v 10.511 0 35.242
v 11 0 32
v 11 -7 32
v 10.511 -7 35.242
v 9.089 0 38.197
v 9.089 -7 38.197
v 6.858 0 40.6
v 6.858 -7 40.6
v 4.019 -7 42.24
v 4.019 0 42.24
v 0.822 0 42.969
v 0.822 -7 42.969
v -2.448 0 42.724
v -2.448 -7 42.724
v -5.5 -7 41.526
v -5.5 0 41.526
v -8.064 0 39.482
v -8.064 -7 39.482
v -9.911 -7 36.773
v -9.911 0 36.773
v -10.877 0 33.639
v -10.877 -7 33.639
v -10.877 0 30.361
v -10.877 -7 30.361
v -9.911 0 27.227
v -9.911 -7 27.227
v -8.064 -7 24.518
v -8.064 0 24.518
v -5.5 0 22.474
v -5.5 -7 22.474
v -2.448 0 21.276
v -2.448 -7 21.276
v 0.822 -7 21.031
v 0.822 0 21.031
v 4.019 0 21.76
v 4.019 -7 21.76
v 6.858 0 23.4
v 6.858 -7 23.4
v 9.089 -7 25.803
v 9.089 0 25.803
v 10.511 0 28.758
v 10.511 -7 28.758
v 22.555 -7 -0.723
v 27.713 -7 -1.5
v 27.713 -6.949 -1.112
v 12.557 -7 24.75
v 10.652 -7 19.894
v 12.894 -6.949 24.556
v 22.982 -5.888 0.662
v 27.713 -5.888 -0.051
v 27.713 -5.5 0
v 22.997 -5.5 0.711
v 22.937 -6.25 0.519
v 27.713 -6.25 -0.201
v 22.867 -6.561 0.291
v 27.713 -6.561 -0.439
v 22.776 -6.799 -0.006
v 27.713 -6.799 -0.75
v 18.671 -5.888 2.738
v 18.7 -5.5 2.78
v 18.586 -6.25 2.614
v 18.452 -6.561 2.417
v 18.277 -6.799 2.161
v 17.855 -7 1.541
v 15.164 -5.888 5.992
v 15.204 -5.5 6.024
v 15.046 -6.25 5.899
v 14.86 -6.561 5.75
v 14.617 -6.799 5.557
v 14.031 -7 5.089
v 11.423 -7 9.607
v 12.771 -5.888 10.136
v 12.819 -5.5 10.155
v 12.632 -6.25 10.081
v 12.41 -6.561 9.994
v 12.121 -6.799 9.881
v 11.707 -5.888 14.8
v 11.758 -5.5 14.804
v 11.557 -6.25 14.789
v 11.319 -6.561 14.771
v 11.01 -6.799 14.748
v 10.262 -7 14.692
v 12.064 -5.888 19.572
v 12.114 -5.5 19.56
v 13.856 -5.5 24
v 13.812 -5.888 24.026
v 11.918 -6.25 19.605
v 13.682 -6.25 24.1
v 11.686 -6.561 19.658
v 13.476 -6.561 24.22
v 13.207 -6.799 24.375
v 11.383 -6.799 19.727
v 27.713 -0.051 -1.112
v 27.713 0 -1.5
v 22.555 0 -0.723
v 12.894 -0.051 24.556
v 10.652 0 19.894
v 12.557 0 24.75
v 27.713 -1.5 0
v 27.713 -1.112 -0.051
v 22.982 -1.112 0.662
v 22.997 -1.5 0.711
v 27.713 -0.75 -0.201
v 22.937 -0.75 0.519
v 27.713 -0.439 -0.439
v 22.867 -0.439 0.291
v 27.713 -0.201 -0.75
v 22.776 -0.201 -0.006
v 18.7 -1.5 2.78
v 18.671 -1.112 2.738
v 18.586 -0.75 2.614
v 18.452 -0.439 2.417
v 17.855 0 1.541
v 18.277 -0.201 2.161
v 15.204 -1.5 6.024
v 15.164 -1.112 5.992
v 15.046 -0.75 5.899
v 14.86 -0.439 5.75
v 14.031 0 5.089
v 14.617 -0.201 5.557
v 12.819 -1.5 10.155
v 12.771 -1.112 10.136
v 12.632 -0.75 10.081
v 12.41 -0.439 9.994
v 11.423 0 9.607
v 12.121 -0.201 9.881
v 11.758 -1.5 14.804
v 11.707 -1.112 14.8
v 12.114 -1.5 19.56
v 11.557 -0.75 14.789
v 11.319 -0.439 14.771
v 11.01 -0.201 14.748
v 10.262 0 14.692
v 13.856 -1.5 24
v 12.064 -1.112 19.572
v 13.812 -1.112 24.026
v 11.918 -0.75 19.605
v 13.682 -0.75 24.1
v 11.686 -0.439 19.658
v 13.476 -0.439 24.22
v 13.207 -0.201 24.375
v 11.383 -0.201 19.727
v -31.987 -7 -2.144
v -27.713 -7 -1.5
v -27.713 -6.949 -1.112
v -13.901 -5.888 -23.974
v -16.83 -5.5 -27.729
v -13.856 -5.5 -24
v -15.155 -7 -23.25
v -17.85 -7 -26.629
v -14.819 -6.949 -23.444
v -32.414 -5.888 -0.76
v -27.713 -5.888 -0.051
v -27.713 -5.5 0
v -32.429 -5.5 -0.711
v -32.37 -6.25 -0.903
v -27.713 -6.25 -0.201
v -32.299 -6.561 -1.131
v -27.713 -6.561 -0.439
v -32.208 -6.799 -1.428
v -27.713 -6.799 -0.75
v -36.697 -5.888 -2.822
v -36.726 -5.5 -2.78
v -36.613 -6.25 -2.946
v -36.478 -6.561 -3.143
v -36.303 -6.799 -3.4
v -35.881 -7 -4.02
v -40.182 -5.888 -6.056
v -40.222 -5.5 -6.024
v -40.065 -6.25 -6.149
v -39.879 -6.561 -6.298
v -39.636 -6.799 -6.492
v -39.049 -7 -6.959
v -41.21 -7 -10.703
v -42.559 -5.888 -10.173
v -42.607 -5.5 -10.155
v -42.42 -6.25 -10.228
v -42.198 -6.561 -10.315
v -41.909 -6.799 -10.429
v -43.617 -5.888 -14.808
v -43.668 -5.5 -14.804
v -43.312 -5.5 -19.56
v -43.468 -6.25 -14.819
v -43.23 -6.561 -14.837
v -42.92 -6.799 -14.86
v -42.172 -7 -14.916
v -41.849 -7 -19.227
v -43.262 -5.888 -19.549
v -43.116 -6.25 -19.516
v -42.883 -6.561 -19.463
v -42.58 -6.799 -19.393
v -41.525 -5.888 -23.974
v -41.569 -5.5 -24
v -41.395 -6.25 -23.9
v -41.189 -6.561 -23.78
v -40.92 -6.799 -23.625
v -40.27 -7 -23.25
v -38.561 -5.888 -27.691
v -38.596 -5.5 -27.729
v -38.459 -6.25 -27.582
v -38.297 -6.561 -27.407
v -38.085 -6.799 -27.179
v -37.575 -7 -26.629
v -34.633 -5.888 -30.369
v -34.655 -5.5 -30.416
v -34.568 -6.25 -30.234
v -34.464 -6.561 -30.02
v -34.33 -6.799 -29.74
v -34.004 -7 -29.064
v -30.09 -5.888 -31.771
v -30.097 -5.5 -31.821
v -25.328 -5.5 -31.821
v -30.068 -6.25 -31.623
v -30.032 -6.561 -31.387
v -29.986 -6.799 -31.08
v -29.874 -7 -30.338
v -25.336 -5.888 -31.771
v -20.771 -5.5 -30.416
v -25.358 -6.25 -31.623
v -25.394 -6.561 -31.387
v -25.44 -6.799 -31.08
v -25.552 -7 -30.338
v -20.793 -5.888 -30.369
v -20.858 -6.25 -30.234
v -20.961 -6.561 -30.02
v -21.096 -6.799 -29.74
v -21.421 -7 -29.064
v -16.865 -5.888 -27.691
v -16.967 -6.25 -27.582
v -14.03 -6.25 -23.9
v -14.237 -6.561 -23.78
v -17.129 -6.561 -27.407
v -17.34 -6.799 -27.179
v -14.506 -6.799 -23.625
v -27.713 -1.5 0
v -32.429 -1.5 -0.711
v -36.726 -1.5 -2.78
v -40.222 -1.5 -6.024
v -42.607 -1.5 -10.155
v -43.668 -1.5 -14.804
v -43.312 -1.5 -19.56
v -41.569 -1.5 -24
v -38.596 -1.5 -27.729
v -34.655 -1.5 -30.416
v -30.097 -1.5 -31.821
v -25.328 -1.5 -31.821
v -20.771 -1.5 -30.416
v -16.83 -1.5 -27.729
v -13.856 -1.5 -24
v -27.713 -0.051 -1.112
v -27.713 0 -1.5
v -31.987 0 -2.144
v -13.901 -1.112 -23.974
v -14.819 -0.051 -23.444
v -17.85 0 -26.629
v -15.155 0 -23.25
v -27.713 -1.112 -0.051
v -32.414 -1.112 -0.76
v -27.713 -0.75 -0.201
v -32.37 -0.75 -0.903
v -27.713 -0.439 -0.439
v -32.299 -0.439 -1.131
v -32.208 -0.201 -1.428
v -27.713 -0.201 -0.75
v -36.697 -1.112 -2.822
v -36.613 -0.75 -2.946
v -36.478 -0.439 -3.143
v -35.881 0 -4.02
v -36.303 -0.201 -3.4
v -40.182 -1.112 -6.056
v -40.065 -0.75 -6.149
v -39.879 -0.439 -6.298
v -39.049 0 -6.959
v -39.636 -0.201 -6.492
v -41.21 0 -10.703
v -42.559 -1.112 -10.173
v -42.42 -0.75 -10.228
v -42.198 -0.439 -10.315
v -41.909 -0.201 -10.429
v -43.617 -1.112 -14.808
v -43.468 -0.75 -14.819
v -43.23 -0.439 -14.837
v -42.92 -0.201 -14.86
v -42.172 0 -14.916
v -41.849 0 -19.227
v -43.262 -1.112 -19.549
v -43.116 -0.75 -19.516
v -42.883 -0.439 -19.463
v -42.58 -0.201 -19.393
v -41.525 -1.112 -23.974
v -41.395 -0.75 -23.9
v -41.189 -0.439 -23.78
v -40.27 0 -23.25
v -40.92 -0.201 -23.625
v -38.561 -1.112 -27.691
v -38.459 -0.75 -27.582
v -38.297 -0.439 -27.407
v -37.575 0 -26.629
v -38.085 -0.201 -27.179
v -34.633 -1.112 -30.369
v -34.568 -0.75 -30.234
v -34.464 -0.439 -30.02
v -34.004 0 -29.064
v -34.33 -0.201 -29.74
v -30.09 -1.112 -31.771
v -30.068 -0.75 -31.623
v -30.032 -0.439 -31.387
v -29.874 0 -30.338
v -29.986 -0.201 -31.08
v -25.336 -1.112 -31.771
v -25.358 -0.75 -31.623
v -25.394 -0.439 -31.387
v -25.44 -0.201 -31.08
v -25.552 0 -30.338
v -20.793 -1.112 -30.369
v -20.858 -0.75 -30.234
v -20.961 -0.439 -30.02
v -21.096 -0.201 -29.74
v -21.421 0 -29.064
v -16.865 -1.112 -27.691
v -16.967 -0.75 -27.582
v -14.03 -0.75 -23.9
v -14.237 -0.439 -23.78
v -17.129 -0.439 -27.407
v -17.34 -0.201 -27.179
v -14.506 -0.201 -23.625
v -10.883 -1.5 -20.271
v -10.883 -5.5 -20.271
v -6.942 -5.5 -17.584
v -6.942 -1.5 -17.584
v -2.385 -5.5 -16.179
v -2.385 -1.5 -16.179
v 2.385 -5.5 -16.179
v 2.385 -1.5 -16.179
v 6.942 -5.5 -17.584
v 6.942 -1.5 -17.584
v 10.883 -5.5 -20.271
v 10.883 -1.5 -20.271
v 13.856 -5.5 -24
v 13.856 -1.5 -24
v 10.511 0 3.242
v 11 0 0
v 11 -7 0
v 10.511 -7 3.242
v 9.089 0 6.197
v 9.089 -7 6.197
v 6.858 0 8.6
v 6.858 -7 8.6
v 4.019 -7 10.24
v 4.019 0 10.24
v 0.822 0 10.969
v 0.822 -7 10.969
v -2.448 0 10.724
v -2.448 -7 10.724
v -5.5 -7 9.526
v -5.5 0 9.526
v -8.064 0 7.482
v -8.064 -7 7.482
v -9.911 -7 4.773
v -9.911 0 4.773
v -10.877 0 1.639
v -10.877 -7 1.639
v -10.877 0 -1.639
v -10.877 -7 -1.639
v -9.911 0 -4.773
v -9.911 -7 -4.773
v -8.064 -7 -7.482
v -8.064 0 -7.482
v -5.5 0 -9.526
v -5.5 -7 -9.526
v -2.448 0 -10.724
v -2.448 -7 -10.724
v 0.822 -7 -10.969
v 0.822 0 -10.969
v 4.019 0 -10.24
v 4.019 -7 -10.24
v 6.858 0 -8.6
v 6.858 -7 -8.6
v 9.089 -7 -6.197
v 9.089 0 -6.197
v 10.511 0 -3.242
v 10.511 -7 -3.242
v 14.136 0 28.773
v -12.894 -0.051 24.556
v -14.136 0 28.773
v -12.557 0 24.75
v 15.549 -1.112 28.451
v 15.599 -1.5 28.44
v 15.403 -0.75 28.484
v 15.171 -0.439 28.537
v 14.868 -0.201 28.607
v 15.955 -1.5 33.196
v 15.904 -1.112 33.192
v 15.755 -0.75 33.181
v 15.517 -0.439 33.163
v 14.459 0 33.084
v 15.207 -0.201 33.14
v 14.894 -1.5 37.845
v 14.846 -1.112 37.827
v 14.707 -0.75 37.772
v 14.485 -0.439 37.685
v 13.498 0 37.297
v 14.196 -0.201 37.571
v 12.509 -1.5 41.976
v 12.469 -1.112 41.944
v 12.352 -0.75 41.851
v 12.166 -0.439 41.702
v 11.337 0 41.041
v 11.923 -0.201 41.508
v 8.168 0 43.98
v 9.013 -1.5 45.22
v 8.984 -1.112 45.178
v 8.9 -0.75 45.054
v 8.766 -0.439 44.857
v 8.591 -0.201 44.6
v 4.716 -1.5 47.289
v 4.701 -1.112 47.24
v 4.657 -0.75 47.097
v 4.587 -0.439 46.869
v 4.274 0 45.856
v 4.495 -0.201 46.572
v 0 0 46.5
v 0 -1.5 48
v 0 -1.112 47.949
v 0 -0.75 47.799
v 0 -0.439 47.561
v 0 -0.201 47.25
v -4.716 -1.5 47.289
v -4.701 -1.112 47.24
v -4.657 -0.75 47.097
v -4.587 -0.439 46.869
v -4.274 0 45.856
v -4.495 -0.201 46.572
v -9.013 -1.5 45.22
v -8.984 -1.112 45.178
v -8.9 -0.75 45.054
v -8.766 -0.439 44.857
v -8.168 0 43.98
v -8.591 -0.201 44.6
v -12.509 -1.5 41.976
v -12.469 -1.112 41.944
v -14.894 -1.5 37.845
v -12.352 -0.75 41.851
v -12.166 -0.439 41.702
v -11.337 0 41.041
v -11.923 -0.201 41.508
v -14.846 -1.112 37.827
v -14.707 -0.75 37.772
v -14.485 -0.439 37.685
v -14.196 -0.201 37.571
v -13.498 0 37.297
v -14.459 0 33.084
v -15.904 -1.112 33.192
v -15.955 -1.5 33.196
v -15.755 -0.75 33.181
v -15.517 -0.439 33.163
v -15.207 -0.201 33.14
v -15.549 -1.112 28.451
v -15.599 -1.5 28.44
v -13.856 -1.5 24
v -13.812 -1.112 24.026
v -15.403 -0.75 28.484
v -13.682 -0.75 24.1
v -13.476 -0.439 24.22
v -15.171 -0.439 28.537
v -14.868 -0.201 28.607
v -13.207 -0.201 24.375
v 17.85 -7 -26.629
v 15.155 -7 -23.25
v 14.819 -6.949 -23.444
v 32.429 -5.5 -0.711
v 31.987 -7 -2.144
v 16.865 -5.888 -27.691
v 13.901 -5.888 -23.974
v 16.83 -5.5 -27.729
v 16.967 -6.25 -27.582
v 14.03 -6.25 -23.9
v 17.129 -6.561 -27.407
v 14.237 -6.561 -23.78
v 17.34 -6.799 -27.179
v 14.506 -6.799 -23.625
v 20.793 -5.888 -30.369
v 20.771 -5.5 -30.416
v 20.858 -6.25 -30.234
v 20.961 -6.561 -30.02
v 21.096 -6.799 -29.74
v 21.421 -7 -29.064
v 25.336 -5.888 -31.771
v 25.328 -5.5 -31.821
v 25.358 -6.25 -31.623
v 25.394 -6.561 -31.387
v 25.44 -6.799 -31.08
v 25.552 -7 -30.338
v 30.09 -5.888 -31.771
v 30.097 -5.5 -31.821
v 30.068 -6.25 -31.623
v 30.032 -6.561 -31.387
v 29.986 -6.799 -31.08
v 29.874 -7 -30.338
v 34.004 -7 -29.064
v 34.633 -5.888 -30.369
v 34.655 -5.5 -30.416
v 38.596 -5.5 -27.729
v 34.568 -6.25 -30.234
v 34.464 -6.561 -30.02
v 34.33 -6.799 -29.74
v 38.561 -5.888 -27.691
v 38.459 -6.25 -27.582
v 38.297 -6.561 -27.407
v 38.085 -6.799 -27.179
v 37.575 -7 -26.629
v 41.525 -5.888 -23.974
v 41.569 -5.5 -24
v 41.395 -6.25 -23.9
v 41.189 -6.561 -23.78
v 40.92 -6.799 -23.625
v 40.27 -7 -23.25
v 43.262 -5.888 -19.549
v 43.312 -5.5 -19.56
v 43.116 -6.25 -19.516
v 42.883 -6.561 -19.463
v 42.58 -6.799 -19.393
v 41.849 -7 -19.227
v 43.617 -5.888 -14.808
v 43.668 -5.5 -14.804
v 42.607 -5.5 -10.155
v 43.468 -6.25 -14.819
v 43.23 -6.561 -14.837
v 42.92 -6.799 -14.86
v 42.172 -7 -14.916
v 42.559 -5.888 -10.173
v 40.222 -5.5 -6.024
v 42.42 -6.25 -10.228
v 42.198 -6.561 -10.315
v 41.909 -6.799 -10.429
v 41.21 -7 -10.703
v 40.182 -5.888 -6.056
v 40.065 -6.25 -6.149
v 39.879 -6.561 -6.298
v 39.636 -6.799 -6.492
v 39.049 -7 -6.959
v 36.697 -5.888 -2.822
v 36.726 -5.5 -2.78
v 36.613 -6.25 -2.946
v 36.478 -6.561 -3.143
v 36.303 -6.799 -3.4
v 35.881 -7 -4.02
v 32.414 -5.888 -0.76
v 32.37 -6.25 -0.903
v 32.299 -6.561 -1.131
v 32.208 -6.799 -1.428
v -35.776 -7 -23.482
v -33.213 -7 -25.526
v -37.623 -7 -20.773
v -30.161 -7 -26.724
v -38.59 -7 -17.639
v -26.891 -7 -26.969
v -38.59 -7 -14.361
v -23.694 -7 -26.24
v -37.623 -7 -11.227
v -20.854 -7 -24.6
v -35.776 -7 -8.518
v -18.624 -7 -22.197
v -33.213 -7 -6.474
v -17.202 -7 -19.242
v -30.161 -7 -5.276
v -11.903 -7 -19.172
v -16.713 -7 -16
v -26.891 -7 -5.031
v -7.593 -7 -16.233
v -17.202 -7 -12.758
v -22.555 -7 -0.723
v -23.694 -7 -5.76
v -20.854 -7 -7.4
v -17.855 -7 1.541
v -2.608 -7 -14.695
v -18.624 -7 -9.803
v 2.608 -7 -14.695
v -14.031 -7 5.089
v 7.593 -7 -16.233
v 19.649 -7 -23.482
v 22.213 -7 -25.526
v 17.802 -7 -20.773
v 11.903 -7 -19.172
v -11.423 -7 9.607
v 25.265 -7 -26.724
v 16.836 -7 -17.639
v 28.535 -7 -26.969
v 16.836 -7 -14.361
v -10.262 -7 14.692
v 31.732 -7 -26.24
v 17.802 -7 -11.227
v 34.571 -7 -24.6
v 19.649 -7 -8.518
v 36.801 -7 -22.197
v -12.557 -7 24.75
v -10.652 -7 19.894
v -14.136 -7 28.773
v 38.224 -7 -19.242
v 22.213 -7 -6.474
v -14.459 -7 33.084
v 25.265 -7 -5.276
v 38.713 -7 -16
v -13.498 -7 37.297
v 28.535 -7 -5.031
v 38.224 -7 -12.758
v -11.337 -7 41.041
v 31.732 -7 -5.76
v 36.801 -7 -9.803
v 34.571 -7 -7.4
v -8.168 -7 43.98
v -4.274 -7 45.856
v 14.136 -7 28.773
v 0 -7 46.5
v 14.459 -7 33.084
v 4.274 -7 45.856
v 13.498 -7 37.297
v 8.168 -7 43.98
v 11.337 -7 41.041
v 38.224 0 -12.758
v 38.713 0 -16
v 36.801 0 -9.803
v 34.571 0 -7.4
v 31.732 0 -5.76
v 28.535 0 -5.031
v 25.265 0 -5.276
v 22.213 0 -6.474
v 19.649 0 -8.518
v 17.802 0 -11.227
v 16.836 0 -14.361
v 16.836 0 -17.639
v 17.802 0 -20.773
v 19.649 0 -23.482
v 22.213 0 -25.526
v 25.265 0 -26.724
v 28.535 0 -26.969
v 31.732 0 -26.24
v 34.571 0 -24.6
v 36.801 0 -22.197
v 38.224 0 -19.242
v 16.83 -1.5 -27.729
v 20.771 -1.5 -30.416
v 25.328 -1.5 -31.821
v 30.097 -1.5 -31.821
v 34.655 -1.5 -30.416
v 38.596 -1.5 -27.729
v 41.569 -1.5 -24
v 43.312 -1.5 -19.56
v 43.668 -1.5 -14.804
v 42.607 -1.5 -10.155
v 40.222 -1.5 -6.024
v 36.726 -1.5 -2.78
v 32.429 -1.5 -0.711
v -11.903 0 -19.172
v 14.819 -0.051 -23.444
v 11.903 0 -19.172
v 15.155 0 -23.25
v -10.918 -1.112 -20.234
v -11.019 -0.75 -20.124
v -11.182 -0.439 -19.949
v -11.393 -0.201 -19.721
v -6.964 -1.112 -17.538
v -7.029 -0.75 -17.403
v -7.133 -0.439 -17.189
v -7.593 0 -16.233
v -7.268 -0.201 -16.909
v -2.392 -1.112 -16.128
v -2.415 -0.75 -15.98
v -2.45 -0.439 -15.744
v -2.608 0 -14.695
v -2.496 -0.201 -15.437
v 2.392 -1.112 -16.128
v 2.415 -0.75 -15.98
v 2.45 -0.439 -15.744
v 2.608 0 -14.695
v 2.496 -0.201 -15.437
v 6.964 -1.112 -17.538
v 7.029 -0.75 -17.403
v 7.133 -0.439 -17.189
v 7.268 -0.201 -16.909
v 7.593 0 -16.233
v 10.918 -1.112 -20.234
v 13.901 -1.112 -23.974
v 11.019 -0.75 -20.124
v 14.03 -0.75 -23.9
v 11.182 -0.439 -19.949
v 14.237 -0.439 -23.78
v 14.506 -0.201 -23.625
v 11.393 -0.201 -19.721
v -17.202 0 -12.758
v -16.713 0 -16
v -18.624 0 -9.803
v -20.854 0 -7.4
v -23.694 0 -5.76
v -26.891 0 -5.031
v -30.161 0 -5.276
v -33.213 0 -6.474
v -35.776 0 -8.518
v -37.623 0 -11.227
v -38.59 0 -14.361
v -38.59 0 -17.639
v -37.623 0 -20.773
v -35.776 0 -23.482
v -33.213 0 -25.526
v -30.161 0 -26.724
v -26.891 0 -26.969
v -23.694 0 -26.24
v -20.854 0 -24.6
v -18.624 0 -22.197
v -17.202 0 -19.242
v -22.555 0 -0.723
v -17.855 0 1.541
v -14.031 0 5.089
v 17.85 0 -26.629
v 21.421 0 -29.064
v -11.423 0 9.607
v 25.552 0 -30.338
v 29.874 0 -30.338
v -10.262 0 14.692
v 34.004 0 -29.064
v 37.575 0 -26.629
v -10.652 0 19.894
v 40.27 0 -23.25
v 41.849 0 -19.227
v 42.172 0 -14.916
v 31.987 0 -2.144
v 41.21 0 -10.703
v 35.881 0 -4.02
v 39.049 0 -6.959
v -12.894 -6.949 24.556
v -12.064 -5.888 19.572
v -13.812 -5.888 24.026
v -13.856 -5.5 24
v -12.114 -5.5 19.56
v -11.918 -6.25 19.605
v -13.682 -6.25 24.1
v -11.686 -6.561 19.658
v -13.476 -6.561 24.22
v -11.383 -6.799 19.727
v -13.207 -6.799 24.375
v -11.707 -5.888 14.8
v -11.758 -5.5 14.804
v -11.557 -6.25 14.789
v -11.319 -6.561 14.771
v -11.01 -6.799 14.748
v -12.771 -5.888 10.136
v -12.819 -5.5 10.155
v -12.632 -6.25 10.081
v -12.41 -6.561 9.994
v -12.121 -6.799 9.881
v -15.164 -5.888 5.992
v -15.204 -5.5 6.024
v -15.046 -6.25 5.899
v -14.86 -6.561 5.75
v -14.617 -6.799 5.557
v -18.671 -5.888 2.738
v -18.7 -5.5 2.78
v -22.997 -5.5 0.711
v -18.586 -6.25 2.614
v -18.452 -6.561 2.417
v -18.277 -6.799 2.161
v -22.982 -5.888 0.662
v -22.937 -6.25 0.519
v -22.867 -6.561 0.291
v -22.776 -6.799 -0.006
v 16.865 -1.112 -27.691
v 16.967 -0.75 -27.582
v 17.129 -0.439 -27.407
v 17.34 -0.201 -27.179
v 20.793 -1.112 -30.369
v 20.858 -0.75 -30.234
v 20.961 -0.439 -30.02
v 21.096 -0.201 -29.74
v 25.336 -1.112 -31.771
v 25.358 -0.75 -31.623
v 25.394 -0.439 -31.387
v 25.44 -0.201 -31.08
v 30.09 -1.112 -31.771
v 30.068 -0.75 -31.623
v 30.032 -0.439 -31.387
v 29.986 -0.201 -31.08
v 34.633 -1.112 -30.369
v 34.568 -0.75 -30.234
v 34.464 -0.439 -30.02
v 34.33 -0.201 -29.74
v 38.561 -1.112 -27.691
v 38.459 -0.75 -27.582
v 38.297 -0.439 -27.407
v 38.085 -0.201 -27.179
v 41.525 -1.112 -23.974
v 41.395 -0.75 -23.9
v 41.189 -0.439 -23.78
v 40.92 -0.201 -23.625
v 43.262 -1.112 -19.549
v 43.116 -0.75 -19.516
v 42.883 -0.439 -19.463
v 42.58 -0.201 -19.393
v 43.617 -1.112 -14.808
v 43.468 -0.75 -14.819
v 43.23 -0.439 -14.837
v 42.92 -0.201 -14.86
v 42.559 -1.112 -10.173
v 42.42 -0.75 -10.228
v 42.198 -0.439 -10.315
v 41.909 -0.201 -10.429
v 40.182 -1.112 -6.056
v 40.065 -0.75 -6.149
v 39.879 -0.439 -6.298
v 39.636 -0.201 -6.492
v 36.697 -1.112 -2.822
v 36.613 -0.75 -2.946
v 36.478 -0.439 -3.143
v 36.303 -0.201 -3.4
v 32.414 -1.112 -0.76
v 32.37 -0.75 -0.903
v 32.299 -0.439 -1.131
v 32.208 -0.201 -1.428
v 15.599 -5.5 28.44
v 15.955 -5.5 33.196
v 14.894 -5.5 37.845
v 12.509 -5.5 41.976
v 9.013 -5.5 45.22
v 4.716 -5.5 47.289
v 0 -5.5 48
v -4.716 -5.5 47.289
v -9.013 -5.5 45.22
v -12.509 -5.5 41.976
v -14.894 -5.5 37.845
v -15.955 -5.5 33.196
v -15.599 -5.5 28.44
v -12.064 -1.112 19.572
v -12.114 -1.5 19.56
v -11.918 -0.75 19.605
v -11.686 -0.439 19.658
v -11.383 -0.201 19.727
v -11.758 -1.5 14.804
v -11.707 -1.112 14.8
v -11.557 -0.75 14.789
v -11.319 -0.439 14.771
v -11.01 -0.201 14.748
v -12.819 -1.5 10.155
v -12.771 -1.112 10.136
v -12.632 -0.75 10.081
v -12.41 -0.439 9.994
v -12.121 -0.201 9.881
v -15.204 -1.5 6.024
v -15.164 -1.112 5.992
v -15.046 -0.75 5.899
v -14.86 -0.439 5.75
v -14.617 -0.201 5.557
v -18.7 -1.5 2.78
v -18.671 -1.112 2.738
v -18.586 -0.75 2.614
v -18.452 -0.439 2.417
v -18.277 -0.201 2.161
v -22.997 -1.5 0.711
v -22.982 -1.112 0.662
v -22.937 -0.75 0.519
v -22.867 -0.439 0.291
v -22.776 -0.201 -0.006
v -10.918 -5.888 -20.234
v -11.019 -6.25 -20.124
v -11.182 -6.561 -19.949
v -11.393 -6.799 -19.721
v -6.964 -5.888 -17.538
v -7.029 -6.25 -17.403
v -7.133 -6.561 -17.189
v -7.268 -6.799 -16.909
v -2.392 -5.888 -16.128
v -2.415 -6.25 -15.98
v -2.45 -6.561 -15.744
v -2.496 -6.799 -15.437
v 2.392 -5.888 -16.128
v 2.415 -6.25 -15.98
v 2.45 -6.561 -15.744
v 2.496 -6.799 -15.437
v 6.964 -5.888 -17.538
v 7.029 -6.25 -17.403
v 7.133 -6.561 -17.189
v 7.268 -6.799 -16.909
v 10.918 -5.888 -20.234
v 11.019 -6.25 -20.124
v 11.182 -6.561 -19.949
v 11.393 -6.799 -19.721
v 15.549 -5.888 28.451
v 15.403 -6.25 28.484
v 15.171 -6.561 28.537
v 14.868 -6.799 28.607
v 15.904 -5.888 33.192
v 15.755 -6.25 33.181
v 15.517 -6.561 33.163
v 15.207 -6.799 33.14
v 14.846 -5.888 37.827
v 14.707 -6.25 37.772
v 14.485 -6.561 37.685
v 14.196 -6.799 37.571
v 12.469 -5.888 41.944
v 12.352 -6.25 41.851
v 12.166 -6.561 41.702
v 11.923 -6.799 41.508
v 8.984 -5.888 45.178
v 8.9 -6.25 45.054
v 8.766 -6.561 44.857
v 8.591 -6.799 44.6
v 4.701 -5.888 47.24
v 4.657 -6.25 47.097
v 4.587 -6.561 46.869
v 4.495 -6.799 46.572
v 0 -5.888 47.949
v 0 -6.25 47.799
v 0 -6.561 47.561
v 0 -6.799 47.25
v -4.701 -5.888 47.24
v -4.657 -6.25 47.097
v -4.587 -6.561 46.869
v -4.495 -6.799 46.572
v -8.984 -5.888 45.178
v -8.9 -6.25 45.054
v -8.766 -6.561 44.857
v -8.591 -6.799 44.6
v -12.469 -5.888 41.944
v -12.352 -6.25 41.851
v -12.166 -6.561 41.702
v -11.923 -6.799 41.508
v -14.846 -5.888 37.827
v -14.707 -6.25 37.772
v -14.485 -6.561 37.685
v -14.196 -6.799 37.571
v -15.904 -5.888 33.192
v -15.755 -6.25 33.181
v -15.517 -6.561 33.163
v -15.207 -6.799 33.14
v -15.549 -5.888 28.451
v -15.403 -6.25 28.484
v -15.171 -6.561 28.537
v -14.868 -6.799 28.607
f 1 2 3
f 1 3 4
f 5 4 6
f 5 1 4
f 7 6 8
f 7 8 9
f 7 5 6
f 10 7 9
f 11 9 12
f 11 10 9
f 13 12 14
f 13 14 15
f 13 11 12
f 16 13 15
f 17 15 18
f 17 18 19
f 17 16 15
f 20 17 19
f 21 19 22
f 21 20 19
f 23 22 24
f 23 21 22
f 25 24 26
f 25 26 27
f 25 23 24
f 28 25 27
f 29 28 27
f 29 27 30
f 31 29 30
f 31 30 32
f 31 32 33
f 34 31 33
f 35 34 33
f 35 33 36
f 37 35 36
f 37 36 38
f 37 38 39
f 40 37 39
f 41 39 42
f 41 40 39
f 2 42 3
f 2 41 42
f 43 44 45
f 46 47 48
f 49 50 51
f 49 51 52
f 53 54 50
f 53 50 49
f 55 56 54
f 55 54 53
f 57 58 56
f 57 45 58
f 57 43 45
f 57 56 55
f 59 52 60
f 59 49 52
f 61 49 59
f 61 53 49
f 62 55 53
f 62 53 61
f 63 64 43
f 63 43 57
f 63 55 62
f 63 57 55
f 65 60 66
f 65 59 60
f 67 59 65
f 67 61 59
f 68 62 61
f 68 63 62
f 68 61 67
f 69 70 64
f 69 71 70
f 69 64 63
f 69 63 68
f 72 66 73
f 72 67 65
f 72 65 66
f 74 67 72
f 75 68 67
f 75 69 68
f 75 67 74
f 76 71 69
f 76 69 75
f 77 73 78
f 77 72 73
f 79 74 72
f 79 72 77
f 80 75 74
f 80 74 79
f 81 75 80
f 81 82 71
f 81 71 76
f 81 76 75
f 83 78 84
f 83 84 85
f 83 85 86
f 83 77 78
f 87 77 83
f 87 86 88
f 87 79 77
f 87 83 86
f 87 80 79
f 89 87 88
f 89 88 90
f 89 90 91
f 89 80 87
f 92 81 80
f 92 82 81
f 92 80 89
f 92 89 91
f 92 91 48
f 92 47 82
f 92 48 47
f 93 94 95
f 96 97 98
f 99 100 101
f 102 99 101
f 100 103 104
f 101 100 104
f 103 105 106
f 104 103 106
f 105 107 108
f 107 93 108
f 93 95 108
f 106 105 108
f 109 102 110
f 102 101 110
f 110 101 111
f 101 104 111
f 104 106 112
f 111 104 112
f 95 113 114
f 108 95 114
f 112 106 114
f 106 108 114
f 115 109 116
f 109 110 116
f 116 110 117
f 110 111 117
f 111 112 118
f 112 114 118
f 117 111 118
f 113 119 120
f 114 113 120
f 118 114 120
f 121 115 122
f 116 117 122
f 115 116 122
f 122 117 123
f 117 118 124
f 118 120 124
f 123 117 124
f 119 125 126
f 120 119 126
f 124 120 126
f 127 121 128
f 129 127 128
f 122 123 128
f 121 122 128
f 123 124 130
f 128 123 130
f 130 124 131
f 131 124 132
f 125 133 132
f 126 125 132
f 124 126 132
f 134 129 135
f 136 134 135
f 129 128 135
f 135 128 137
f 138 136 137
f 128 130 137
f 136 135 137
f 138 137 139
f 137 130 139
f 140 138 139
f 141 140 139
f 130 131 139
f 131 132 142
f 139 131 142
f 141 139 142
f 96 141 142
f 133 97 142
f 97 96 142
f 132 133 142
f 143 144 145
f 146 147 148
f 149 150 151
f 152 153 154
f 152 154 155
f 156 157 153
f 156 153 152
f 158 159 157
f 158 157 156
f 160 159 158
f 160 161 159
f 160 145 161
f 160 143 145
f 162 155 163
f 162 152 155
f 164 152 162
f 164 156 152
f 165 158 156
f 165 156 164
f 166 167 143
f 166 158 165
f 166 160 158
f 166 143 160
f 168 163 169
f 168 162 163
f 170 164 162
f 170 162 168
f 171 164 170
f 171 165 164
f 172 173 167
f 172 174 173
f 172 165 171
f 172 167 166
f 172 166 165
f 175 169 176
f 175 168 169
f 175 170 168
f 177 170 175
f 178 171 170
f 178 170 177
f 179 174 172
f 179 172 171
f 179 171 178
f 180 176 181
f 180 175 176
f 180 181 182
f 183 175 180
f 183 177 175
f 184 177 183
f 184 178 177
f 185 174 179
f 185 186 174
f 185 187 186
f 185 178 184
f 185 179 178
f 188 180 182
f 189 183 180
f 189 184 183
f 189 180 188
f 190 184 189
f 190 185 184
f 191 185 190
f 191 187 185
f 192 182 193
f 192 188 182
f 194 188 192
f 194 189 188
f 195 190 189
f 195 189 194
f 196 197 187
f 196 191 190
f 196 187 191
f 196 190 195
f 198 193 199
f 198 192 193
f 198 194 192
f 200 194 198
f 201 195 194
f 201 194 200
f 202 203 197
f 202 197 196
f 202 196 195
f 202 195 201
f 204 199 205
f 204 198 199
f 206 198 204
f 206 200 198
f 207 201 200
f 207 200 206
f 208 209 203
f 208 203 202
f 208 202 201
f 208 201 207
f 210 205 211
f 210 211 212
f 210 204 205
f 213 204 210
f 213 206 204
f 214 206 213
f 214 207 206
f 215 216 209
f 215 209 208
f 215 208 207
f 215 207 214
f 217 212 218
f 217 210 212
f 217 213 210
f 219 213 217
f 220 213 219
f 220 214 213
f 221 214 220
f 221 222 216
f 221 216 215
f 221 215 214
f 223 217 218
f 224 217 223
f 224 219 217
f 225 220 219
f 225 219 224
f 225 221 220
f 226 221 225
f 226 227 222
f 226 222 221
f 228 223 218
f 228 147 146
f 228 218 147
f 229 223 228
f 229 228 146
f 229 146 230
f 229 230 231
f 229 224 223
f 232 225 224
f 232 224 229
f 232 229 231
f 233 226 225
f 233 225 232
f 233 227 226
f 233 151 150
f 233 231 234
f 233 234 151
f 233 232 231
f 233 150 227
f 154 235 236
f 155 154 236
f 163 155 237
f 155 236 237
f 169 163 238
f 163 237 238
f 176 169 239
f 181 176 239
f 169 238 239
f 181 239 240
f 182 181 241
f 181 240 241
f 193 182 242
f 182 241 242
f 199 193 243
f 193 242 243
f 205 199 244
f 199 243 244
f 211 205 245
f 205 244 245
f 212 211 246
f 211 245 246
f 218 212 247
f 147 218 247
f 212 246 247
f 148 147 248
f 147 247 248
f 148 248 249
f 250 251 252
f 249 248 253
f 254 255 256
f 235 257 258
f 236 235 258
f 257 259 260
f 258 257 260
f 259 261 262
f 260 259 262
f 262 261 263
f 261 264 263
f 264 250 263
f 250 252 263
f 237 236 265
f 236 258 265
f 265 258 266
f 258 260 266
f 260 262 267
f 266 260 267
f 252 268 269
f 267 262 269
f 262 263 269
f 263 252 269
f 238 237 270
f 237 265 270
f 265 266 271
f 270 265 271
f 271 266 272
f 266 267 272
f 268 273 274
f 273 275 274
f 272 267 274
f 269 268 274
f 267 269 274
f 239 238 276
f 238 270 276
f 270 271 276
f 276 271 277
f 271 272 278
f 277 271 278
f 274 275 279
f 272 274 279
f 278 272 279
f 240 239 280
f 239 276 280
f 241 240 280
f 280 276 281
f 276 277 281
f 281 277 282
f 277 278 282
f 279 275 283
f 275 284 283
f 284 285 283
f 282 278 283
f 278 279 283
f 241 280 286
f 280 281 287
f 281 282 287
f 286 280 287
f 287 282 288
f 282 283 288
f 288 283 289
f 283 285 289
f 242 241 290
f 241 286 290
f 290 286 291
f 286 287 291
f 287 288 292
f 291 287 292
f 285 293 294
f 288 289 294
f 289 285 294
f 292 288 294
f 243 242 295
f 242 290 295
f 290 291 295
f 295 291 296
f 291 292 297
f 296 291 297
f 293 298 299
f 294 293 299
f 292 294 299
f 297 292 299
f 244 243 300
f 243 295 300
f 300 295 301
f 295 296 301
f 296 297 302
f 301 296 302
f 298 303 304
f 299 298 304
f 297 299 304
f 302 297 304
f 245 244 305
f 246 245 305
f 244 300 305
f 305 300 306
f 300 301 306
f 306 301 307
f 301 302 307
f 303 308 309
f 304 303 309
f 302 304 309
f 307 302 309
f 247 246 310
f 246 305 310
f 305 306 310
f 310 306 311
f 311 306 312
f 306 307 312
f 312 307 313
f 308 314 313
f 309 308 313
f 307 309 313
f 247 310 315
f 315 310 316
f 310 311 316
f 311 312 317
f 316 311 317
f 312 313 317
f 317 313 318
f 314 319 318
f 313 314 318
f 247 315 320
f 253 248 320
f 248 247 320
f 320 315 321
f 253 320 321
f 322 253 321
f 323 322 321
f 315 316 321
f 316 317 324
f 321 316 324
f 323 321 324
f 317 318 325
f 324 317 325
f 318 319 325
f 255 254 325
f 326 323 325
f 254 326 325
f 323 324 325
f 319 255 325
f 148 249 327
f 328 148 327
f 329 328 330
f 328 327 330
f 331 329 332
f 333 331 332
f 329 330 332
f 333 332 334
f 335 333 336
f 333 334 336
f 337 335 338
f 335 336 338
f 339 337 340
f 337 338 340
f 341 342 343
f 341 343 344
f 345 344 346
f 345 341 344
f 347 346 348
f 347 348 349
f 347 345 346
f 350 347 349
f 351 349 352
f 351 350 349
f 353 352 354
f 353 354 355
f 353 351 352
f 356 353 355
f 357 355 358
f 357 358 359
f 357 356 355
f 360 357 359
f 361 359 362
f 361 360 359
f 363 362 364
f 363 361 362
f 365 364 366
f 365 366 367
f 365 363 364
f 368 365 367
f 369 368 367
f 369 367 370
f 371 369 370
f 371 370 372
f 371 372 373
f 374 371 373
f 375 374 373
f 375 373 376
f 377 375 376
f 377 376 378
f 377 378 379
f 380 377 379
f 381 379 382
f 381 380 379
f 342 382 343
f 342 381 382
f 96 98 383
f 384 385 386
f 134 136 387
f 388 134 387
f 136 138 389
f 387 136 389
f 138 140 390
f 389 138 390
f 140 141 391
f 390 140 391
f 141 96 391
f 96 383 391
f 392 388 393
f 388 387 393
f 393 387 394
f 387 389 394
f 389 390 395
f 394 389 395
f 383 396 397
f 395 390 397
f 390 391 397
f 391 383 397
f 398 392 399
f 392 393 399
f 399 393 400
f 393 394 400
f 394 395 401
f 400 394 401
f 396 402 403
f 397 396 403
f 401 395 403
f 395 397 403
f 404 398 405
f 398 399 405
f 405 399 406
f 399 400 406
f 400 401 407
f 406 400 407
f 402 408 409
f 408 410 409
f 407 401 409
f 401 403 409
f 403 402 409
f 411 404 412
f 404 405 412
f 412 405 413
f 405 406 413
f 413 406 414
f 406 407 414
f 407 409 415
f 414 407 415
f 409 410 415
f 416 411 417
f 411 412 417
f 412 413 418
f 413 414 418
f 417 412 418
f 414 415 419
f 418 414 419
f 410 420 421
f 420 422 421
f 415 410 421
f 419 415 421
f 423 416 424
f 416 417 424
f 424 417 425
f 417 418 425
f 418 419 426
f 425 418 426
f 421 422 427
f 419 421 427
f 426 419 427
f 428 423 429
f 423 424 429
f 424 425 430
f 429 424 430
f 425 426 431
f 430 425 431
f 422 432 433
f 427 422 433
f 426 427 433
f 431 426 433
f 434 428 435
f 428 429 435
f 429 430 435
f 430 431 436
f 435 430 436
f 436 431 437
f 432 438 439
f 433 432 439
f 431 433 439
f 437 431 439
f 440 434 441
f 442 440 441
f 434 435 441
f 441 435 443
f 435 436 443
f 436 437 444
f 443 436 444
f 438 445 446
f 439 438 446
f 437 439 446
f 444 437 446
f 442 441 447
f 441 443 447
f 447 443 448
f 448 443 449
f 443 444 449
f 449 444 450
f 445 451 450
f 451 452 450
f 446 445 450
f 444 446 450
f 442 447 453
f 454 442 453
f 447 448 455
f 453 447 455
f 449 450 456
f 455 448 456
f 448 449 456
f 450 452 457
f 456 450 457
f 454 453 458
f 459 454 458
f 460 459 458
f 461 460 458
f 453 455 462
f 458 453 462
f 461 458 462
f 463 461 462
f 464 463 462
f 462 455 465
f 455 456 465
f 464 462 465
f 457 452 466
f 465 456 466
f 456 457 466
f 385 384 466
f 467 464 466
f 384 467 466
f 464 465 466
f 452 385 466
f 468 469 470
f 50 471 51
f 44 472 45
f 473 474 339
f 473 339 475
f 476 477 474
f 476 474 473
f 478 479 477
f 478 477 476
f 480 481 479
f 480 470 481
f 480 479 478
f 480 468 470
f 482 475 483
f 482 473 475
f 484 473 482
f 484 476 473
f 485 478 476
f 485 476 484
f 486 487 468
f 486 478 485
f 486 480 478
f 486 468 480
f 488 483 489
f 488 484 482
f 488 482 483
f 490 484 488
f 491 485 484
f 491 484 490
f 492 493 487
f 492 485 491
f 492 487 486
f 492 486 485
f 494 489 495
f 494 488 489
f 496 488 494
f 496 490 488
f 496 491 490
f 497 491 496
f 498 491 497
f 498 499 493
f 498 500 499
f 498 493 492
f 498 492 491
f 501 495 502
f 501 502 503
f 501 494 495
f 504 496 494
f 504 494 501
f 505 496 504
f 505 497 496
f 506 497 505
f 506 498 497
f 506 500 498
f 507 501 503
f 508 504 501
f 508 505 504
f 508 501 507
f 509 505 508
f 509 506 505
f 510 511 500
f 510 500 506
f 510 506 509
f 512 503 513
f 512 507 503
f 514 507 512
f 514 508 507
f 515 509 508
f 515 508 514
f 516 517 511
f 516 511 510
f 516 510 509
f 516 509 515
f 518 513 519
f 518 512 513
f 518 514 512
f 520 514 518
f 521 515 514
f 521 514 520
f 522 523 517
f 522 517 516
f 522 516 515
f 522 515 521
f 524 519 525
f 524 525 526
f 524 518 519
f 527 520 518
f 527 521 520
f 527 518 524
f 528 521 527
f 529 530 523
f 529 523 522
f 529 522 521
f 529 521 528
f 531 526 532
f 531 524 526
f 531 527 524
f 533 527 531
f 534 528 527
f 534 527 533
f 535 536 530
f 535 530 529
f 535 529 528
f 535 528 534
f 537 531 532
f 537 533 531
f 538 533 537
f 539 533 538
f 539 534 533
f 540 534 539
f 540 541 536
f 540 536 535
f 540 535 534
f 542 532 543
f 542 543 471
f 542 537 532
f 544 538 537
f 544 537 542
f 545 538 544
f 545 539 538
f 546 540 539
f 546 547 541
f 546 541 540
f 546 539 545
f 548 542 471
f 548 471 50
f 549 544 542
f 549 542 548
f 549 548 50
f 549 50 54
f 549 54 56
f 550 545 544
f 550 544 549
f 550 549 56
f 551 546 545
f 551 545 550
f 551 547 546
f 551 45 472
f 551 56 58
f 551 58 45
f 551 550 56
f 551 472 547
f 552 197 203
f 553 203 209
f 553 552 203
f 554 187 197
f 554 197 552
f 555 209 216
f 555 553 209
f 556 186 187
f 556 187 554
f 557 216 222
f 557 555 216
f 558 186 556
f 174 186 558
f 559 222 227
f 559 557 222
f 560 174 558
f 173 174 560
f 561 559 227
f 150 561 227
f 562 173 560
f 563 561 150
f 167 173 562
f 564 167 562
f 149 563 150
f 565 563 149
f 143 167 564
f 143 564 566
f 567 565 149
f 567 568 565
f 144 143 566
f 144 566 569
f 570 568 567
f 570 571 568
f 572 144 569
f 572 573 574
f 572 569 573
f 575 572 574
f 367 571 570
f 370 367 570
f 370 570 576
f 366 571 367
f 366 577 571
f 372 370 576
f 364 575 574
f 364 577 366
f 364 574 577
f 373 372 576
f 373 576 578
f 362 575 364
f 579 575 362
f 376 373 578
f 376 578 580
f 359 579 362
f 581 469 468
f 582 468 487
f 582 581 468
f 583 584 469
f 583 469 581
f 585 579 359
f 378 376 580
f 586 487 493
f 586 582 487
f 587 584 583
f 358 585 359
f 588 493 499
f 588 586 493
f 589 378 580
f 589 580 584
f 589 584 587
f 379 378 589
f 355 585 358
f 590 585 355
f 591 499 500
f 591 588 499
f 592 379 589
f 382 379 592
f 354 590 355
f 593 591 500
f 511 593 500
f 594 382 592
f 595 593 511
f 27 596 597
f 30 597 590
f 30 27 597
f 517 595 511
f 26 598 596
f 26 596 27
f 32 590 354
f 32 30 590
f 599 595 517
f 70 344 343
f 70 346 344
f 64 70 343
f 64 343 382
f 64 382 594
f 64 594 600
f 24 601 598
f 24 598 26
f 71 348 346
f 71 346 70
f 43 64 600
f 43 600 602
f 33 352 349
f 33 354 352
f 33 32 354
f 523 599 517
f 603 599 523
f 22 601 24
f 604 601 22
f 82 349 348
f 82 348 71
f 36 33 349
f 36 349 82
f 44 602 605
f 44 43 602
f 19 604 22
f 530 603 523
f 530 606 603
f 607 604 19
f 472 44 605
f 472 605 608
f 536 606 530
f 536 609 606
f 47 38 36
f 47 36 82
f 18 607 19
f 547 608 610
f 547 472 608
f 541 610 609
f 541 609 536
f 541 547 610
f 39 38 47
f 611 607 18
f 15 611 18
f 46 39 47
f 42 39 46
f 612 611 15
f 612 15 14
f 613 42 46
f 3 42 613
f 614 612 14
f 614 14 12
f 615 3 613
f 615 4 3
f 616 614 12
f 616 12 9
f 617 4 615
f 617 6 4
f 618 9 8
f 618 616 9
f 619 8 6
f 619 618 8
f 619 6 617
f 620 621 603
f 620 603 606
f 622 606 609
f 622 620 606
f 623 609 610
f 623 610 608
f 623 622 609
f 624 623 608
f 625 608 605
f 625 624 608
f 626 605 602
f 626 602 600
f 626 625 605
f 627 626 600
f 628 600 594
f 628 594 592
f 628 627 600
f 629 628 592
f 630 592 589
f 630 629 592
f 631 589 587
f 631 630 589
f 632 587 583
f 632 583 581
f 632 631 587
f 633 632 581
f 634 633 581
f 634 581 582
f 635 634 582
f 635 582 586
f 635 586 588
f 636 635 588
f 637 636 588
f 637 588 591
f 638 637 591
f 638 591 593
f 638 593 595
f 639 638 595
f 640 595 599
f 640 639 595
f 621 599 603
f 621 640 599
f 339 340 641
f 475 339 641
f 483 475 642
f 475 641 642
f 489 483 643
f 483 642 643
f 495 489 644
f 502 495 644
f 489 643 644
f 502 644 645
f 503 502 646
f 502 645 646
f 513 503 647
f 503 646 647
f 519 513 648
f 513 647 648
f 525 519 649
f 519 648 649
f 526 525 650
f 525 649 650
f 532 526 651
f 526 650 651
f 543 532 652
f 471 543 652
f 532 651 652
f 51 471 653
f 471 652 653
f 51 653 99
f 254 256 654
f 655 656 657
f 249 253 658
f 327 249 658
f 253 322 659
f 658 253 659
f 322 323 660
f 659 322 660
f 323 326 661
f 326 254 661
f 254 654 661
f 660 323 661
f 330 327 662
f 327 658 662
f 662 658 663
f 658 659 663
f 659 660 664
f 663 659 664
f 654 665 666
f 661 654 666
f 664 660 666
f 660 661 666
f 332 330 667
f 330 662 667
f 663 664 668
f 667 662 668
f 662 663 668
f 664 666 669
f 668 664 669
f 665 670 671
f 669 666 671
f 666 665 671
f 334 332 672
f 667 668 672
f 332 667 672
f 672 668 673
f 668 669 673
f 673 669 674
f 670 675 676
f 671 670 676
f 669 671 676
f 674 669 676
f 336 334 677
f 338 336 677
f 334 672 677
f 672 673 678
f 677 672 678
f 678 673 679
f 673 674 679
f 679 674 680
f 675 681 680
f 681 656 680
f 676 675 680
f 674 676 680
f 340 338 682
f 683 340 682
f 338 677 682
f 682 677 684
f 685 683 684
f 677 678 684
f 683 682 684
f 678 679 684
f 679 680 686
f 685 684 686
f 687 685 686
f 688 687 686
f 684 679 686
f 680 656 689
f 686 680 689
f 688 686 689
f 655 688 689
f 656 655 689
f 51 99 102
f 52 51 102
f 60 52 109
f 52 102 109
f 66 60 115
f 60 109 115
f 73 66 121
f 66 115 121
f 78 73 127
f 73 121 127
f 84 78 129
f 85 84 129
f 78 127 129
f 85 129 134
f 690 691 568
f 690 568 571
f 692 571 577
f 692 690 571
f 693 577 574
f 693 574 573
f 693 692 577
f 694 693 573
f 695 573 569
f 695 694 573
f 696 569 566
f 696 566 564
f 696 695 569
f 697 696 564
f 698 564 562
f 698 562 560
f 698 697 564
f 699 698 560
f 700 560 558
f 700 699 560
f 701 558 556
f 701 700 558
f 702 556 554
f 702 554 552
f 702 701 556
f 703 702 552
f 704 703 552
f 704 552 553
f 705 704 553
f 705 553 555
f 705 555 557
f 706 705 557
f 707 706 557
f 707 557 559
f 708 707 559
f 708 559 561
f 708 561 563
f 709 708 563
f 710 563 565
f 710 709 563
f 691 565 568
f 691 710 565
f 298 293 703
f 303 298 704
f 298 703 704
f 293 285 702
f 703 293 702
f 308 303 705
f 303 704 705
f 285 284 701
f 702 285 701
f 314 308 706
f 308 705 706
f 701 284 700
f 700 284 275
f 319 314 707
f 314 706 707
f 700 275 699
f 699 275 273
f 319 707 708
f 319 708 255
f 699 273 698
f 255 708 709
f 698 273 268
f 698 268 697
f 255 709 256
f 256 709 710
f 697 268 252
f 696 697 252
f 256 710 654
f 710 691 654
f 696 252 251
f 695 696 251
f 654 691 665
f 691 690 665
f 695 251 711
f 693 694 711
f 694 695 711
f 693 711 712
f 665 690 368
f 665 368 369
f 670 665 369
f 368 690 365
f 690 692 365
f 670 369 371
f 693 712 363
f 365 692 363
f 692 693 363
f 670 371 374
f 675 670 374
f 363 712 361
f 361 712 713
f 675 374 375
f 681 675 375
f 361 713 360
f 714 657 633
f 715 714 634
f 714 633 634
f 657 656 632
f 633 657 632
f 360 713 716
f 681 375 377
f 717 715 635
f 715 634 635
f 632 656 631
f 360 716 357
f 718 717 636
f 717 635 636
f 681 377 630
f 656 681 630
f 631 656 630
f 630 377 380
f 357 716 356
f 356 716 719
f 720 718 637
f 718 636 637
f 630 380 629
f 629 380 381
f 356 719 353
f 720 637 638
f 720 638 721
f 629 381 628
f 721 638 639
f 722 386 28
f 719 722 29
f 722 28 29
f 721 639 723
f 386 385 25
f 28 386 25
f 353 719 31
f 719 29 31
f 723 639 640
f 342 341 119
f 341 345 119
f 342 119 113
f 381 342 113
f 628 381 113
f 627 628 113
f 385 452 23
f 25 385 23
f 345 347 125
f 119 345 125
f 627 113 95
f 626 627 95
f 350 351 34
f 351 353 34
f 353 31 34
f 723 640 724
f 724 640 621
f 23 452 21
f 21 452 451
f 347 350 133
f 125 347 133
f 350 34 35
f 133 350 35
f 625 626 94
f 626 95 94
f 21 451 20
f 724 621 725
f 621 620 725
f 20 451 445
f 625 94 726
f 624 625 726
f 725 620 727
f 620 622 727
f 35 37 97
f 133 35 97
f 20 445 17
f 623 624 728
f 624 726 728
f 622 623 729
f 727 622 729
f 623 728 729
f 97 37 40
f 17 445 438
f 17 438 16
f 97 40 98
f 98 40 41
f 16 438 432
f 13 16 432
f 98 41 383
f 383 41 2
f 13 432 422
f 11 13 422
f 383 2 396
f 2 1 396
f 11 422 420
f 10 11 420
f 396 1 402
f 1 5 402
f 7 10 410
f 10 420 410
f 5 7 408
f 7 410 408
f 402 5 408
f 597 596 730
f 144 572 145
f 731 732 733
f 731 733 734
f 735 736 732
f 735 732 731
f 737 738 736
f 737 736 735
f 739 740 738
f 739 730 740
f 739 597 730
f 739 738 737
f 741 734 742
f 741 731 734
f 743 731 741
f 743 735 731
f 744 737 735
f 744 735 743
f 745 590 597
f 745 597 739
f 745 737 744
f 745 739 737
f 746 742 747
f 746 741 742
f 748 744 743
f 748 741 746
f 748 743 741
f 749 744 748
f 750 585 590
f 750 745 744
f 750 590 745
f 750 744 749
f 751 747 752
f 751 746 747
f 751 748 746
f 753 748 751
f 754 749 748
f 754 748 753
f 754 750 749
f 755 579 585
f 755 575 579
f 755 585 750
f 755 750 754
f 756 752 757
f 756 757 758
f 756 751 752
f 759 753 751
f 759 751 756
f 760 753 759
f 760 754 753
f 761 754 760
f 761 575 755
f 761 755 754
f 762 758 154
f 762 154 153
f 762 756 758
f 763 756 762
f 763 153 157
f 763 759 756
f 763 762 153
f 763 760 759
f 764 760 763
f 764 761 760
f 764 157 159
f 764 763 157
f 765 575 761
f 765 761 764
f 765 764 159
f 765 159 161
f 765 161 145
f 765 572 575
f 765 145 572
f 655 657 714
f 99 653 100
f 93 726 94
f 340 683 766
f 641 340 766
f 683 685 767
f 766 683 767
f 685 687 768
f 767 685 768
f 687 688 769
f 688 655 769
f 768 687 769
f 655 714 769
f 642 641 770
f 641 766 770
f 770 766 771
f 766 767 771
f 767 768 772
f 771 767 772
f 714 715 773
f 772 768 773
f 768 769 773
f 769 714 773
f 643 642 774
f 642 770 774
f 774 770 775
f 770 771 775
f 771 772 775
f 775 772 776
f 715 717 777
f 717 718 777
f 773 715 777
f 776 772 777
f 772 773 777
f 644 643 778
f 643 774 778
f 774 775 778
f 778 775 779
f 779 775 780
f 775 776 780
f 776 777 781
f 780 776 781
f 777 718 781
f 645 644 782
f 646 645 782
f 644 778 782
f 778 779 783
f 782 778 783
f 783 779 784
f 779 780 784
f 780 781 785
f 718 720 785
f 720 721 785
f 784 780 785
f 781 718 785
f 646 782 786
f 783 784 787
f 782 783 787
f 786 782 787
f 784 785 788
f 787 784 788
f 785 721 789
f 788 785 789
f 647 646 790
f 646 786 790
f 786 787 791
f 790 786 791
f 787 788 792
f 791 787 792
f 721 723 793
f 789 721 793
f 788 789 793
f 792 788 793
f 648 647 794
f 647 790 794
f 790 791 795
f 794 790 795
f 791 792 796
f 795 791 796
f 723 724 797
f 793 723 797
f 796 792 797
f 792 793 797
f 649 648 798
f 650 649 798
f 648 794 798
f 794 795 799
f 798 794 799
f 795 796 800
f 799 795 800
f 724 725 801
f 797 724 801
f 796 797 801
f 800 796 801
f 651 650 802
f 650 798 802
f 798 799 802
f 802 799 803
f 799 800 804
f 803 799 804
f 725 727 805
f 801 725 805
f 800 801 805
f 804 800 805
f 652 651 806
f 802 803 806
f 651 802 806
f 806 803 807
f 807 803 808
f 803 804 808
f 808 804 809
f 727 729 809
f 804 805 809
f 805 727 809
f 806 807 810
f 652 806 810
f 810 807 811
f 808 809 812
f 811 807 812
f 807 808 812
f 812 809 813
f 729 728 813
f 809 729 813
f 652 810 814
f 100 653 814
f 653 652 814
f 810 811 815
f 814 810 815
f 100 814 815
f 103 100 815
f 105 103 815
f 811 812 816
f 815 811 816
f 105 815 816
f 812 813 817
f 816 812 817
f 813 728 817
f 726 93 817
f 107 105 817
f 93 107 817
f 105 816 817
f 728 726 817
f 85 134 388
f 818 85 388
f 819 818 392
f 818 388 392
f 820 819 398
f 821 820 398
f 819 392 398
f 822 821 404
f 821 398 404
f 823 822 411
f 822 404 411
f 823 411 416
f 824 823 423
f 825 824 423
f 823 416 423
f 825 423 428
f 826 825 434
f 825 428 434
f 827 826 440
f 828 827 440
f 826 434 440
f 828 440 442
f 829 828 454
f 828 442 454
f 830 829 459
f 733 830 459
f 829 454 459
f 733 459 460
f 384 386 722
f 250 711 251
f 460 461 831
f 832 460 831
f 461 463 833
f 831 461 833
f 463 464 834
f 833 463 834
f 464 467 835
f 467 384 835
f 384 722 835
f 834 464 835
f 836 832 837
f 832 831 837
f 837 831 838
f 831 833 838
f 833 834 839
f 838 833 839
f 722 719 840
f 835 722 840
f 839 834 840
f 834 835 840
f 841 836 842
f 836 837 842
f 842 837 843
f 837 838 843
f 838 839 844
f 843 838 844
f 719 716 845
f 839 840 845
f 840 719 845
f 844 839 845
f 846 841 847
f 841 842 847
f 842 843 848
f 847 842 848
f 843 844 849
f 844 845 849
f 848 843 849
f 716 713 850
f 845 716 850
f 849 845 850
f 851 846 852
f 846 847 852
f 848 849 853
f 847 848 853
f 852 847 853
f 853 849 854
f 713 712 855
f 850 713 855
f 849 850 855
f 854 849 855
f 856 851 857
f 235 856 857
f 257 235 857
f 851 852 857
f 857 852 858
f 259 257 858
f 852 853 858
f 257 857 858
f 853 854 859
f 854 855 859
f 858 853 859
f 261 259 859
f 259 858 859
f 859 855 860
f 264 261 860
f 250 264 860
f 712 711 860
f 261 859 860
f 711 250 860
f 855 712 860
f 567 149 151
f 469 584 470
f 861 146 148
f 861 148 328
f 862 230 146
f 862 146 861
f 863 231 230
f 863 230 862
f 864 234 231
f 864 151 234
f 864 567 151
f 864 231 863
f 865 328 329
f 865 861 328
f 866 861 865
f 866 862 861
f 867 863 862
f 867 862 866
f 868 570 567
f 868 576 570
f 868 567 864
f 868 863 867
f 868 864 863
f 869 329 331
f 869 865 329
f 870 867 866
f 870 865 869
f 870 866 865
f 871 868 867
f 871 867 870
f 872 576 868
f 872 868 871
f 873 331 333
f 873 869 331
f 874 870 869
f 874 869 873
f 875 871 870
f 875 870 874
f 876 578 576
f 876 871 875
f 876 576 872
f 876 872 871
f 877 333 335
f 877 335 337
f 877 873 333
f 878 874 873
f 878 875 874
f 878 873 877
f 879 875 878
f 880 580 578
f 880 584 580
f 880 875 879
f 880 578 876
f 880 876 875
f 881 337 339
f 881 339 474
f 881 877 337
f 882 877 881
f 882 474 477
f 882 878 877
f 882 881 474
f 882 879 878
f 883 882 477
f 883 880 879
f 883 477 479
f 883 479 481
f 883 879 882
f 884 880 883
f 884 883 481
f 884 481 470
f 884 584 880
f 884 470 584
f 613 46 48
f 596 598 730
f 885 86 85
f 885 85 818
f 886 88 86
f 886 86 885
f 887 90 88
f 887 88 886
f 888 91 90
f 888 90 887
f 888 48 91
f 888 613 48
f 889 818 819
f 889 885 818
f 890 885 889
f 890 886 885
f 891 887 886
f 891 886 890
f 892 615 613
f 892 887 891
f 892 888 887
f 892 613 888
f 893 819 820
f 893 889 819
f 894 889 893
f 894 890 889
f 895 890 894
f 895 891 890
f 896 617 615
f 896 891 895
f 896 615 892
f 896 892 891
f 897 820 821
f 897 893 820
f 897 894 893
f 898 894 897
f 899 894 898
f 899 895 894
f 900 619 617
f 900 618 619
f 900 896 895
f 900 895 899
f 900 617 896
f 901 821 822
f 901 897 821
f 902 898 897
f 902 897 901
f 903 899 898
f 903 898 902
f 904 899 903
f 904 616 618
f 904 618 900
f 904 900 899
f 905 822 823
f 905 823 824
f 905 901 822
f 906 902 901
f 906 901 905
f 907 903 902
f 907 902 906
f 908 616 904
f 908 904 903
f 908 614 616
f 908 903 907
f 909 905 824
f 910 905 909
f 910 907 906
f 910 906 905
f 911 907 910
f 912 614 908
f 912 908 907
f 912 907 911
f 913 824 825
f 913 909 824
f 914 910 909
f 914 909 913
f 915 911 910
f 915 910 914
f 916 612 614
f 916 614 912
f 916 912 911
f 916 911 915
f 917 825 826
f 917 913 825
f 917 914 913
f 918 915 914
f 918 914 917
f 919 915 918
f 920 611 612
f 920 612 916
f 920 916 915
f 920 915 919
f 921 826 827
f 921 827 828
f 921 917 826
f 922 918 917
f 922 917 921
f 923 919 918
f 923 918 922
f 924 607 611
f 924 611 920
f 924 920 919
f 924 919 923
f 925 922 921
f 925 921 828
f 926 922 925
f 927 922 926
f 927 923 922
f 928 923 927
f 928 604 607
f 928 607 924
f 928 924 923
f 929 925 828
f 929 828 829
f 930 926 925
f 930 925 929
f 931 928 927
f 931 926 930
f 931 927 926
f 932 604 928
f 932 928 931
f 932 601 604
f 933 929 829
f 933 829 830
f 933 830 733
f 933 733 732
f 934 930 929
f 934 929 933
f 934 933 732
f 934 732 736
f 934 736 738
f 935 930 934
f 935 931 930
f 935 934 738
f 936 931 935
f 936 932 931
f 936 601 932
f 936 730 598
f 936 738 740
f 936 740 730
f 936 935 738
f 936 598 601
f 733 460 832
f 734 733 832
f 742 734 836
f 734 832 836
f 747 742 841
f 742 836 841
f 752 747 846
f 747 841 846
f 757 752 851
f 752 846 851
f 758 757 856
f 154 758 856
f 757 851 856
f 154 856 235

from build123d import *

# Parameters (mm, degrees)
F0_R     = 11
F1_DEPTH = 7
F2_R     = 1.5


with BuildPart() as f1:
    # F0 (on Front) → F1 (new body)
    with BuildSketch(Plane.XZ):
        with BuildLine():
            ThreePointArc((27.712813, 0), (13.856406, 8), (13.856406, 24))
            ThreePointArc((13.856406, 24), (0, 48), (-13.856406, 24))
            ThreePointArc((-13.856406, 24), (-13.856406, 8), (-27.712813, 0))
            ThreePointArc((-27.712813, 0), (-41.569219, -24), (-13.856406, -24))
            ThreePointArc((-13.856406, -24), (0, -16), (13.856406, -24))
            ThreePointArc((13.856406, -24), (41.569219, -24), (27.712813, 0))
        make_face()
        with Locations((-27.712813, -16)):
            Circle(F0_R, mode=Mode.SUBTRACT)
        with Locations((27.712813, -16)):
            Circle(F0_R, mode=Mode.SUBTRACT)
        Circle(F0_R, mode=Mode.SUBTRACT)
        with Locations((0, 32)):
            Circle(F0_R, mode=Mode.SUBTRACT)
    extrude(amount=F1_DEPTH)

    # F2
    f2_edges = [f1.edges().sort_by_distance(p)[0] for p in [
        (27.712813, -3.5, 0),
        (13.856406, -3.5, 24),
        (13.856406, 0, 8),
        (13.856406, -7, 8),
        (13.856406, -3.5, -24),
        (41.569219, 0, -24),
        (41.569219, -7, -24),
        (-13.856406, -3.5, 24),
        (0, 0, 48),
        (0, -7, 48),
        (-13.856406, -7, 8),
        (-27.712813, -3.5, 0),
        (-13.856406, 0, 8),
        (-13.856406, -3.5, -24),
        (-41.569219, 0, -24),
        (-41.569219, -7, -24),
        (0, 0, -16),
        (0, -7, -16),
    ]]
    fillet(f2_edges, radius=F2_R)


solid = f1.part
